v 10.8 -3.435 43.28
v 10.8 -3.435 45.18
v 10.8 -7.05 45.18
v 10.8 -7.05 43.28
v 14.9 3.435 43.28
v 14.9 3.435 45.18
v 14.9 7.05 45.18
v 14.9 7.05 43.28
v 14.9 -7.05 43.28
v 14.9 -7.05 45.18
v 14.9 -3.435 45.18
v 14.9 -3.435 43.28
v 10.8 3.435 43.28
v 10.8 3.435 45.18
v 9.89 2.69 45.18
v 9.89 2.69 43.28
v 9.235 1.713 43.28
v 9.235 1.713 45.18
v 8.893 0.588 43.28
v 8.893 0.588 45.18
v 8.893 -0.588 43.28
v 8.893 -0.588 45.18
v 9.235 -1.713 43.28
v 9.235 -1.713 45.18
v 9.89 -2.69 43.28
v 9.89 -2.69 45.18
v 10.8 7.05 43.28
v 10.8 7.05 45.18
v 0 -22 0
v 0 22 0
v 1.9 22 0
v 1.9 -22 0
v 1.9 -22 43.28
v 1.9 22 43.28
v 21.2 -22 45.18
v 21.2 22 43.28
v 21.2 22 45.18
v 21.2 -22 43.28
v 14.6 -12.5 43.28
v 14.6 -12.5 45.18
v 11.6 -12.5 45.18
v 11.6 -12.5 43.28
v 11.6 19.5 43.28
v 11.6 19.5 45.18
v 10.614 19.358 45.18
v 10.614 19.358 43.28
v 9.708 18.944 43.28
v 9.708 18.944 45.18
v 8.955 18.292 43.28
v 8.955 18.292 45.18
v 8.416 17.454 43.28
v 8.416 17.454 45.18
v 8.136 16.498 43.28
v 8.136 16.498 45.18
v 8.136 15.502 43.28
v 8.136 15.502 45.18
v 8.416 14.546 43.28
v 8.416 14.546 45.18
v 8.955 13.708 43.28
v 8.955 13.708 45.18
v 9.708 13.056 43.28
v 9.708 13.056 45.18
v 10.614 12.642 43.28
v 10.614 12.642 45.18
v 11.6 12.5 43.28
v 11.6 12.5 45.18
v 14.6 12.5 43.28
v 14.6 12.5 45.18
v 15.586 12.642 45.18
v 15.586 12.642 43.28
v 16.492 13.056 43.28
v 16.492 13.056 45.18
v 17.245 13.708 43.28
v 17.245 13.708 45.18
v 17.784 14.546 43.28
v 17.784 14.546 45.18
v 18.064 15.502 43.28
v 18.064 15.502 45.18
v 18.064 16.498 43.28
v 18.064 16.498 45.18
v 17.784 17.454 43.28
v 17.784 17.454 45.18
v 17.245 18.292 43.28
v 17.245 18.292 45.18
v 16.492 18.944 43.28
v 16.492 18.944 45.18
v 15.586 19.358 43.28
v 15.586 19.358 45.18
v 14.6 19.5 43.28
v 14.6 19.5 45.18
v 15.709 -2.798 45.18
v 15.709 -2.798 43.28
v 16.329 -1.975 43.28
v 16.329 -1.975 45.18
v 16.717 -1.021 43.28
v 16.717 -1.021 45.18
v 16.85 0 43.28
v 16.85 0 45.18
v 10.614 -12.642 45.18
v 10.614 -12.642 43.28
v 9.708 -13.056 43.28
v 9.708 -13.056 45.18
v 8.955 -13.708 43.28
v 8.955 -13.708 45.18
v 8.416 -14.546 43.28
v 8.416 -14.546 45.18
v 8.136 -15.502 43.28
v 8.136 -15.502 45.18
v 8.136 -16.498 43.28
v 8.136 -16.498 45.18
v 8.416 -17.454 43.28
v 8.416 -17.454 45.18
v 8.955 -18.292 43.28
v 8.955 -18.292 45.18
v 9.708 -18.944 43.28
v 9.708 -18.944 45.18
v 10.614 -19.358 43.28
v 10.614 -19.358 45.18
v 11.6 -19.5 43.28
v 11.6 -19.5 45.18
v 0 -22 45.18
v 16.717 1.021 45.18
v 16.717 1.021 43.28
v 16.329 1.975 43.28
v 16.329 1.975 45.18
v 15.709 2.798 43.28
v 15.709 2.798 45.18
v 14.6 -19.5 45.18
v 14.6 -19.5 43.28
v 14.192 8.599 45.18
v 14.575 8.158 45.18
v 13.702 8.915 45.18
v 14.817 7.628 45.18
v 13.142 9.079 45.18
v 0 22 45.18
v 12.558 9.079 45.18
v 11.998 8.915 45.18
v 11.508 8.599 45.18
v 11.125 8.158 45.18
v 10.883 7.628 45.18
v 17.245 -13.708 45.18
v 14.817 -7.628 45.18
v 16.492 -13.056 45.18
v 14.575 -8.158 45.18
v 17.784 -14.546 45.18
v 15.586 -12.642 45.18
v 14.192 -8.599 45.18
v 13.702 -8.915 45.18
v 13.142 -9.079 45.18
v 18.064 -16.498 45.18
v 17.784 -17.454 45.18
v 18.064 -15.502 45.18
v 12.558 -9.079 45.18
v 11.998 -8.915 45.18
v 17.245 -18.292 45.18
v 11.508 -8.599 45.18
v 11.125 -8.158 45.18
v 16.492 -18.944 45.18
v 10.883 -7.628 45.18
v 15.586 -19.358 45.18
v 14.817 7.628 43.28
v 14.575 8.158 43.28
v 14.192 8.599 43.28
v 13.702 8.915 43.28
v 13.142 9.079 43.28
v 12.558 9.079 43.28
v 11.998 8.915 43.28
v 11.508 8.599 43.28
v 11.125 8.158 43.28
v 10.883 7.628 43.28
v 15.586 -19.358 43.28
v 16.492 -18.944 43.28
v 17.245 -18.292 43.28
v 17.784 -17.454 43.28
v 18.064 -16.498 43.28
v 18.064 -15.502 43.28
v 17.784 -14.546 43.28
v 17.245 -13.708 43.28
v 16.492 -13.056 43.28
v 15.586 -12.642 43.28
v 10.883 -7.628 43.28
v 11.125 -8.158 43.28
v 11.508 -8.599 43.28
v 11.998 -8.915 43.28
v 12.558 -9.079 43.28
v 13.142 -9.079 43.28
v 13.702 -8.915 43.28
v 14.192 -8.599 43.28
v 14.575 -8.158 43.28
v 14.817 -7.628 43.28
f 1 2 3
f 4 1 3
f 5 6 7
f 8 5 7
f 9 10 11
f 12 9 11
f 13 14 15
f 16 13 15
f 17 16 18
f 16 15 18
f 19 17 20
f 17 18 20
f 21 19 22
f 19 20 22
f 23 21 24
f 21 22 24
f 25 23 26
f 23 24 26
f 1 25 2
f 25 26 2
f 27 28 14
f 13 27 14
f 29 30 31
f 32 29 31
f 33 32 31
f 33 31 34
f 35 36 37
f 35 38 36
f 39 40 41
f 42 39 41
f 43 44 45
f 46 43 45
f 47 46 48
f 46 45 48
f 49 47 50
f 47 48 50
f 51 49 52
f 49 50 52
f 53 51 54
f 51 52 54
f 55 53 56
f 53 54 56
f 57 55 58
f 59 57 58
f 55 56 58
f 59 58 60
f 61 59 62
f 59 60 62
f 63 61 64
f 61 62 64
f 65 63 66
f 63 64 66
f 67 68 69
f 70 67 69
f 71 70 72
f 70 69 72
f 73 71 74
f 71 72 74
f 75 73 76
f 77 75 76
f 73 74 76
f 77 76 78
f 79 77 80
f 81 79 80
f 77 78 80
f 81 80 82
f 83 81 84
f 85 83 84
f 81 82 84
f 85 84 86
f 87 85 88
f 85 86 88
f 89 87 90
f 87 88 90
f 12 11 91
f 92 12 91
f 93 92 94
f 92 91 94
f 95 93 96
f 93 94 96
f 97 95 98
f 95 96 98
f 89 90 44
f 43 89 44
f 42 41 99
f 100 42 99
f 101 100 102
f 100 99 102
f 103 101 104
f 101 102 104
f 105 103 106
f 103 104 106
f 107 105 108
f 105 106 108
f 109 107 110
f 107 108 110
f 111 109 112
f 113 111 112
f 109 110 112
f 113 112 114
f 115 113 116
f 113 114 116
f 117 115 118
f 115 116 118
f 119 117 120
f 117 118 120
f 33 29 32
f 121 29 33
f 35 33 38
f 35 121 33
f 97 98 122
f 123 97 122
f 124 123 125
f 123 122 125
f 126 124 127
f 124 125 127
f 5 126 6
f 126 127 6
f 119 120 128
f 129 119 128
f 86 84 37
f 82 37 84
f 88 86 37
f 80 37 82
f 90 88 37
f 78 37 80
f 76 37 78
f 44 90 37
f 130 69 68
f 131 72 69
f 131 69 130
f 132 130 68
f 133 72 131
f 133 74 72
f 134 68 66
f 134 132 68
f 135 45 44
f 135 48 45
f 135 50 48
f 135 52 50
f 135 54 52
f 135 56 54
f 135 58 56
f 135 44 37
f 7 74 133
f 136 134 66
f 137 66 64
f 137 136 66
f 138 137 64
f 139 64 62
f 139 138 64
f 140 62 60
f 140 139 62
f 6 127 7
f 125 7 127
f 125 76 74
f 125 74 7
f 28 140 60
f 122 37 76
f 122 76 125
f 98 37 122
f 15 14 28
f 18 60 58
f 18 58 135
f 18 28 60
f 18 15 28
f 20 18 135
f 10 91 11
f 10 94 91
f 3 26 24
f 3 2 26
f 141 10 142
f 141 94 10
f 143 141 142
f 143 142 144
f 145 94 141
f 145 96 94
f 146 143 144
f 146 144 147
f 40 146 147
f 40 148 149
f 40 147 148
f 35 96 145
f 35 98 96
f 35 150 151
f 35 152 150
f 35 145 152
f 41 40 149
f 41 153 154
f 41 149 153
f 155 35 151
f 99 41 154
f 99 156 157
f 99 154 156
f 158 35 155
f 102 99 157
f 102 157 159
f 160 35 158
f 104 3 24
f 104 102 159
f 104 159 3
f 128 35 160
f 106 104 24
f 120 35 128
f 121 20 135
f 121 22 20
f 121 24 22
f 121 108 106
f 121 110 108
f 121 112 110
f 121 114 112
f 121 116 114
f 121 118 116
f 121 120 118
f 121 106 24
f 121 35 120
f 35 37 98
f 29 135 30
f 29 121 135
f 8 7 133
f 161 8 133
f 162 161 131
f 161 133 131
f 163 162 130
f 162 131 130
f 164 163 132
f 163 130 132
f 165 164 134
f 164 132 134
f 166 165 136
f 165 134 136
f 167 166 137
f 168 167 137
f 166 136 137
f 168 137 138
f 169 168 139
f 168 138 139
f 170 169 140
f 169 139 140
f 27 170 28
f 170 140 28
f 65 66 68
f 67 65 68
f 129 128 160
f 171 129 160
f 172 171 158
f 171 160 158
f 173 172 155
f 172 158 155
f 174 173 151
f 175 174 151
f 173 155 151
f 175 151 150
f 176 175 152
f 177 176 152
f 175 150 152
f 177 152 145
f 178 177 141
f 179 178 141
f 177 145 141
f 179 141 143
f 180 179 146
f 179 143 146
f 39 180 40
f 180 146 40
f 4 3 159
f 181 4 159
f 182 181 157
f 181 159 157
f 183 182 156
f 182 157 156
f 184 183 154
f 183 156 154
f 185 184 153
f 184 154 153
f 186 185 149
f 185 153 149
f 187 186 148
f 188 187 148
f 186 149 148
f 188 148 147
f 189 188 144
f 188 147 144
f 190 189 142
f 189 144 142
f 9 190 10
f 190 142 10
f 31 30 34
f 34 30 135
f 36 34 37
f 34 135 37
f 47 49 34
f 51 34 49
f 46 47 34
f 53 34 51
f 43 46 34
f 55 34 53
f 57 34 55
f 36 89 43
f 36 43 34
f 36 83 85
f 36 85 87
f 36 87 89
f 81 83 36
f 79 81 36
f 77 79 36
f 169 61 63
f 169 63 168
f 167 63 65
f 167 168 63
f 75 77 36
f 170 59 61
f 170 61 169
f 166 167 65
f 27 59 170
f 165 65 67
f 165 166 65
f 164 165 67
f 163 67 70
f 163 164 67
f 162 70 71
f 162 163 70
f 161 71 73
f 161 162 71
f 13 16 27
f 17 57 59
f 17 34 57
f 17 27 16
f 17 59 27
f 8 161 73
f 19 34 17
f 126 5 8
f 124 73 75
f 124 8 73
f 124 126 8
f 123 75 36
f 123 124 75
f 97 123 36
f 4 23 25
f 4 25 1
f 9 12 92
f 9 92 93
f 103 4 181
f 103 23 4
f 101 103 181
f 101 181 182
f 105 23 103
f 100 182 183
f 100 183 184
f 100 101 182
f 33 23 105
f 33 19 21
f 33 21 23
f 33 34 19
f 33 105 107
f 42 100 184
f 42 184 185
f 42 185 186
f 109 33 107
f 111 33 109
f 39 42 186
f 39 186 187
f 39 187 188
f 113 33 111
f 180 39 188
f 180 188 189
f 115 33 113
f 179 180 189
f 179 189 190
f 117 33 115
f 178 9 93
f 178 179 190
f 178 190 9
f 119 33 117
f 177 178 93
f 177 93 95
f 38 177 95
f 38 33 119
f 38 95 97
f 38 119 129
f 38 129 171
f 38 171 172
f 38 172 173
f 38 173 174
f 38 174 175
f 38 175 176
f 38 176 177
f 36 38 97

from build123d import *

# Parameters (mm, degrees)
F1_DEPTH = 22
F3_DEPTH = 45.181


with BuildPart() as f1:
    # F0 (on Front) → F1 (new body, symmetric)
    with BuildSketch(Plane.XZ):
        Polygon((0, 45.18), (0, 0), (1.9, 0), (1.9, 43.28), (21.2, 43.28), (21.2, 45.18), align=None)
    extrude(amount=F1_DEPTH, both=True)

    # F2 (on face) → F3 (cut, through all)
    with BuildSketch(Plane.XY.offset(45.18)):
        with BuildLine():
            ThreePointArc((11.6, -12.5), (8.1, -16), (11.6, -19.5))
            Line((11.6, -19.5), (14.6, -19.5))
            ThreePointArc((14.6, -19.5), (18.1, -16), (14.6, -12.5))
            Line((14.6, -12.5), (11.6, -12.5))
        make_face()
        with BuildLine():
            ThreePointArc((11.6, 19.5), (8.1, 16), (11.6, 12.5))
            Line((11.6, 12.5), (14.6, 12.5))
            ThreePointArc((14.6, 12.5), (18.1, 16), (14.6, 19.5))
            Line((14.6, 19.5), (11.6, 19.5))
        make_face()
        with BuildLine():
            ThreePointArc((14.9, 7.05), (12.85, 9.1), (10.8, 7.05))
            Line((10.8, 7.05), (10.8, 3.434749))
            ThreePointArc((10.8, 3.434749), (12.85, 4), (14.9, 3.434749))
            Line((14.9, 3.434749), (14.9, 7.05))
        make_face()
        with BuildLine():
            ThreePointArc((14.9, 3.434749), (12.85, 4), (10.8, 3.434749))
            ThreePointArc((10.8, 3.434749), (8.85, 0), (10.8, -3.434749))
            ThreePointArc((10.8, -3.434749), (12.85, -4), (14.9, -3.434749))
            ThreePointArc((14.9, -3.434749), (16.328505, -1.974842), (16.85, 0))
            ThreePointArc((16.85, 0), (16.328505, 1.974842), (14.9, 3.434749))
        make_face()
        with BuildLine():
            ThreePointArc((14.9, -3.434749), (12.85, -4), (10.8, -3.434749))
            Line((10.8, -3.434749), (10.8, -7.05))
            ThreePointArc((10.8, -7.05), (12.85, -9.1), (14.9, -7.05))
            Line((14.9, -7.05), (14.9, -3.434749))
        make_face()
    extrude(amount=-F3_DEPTH, mode=Mode.SUBTRACT)


solid = f1.part
